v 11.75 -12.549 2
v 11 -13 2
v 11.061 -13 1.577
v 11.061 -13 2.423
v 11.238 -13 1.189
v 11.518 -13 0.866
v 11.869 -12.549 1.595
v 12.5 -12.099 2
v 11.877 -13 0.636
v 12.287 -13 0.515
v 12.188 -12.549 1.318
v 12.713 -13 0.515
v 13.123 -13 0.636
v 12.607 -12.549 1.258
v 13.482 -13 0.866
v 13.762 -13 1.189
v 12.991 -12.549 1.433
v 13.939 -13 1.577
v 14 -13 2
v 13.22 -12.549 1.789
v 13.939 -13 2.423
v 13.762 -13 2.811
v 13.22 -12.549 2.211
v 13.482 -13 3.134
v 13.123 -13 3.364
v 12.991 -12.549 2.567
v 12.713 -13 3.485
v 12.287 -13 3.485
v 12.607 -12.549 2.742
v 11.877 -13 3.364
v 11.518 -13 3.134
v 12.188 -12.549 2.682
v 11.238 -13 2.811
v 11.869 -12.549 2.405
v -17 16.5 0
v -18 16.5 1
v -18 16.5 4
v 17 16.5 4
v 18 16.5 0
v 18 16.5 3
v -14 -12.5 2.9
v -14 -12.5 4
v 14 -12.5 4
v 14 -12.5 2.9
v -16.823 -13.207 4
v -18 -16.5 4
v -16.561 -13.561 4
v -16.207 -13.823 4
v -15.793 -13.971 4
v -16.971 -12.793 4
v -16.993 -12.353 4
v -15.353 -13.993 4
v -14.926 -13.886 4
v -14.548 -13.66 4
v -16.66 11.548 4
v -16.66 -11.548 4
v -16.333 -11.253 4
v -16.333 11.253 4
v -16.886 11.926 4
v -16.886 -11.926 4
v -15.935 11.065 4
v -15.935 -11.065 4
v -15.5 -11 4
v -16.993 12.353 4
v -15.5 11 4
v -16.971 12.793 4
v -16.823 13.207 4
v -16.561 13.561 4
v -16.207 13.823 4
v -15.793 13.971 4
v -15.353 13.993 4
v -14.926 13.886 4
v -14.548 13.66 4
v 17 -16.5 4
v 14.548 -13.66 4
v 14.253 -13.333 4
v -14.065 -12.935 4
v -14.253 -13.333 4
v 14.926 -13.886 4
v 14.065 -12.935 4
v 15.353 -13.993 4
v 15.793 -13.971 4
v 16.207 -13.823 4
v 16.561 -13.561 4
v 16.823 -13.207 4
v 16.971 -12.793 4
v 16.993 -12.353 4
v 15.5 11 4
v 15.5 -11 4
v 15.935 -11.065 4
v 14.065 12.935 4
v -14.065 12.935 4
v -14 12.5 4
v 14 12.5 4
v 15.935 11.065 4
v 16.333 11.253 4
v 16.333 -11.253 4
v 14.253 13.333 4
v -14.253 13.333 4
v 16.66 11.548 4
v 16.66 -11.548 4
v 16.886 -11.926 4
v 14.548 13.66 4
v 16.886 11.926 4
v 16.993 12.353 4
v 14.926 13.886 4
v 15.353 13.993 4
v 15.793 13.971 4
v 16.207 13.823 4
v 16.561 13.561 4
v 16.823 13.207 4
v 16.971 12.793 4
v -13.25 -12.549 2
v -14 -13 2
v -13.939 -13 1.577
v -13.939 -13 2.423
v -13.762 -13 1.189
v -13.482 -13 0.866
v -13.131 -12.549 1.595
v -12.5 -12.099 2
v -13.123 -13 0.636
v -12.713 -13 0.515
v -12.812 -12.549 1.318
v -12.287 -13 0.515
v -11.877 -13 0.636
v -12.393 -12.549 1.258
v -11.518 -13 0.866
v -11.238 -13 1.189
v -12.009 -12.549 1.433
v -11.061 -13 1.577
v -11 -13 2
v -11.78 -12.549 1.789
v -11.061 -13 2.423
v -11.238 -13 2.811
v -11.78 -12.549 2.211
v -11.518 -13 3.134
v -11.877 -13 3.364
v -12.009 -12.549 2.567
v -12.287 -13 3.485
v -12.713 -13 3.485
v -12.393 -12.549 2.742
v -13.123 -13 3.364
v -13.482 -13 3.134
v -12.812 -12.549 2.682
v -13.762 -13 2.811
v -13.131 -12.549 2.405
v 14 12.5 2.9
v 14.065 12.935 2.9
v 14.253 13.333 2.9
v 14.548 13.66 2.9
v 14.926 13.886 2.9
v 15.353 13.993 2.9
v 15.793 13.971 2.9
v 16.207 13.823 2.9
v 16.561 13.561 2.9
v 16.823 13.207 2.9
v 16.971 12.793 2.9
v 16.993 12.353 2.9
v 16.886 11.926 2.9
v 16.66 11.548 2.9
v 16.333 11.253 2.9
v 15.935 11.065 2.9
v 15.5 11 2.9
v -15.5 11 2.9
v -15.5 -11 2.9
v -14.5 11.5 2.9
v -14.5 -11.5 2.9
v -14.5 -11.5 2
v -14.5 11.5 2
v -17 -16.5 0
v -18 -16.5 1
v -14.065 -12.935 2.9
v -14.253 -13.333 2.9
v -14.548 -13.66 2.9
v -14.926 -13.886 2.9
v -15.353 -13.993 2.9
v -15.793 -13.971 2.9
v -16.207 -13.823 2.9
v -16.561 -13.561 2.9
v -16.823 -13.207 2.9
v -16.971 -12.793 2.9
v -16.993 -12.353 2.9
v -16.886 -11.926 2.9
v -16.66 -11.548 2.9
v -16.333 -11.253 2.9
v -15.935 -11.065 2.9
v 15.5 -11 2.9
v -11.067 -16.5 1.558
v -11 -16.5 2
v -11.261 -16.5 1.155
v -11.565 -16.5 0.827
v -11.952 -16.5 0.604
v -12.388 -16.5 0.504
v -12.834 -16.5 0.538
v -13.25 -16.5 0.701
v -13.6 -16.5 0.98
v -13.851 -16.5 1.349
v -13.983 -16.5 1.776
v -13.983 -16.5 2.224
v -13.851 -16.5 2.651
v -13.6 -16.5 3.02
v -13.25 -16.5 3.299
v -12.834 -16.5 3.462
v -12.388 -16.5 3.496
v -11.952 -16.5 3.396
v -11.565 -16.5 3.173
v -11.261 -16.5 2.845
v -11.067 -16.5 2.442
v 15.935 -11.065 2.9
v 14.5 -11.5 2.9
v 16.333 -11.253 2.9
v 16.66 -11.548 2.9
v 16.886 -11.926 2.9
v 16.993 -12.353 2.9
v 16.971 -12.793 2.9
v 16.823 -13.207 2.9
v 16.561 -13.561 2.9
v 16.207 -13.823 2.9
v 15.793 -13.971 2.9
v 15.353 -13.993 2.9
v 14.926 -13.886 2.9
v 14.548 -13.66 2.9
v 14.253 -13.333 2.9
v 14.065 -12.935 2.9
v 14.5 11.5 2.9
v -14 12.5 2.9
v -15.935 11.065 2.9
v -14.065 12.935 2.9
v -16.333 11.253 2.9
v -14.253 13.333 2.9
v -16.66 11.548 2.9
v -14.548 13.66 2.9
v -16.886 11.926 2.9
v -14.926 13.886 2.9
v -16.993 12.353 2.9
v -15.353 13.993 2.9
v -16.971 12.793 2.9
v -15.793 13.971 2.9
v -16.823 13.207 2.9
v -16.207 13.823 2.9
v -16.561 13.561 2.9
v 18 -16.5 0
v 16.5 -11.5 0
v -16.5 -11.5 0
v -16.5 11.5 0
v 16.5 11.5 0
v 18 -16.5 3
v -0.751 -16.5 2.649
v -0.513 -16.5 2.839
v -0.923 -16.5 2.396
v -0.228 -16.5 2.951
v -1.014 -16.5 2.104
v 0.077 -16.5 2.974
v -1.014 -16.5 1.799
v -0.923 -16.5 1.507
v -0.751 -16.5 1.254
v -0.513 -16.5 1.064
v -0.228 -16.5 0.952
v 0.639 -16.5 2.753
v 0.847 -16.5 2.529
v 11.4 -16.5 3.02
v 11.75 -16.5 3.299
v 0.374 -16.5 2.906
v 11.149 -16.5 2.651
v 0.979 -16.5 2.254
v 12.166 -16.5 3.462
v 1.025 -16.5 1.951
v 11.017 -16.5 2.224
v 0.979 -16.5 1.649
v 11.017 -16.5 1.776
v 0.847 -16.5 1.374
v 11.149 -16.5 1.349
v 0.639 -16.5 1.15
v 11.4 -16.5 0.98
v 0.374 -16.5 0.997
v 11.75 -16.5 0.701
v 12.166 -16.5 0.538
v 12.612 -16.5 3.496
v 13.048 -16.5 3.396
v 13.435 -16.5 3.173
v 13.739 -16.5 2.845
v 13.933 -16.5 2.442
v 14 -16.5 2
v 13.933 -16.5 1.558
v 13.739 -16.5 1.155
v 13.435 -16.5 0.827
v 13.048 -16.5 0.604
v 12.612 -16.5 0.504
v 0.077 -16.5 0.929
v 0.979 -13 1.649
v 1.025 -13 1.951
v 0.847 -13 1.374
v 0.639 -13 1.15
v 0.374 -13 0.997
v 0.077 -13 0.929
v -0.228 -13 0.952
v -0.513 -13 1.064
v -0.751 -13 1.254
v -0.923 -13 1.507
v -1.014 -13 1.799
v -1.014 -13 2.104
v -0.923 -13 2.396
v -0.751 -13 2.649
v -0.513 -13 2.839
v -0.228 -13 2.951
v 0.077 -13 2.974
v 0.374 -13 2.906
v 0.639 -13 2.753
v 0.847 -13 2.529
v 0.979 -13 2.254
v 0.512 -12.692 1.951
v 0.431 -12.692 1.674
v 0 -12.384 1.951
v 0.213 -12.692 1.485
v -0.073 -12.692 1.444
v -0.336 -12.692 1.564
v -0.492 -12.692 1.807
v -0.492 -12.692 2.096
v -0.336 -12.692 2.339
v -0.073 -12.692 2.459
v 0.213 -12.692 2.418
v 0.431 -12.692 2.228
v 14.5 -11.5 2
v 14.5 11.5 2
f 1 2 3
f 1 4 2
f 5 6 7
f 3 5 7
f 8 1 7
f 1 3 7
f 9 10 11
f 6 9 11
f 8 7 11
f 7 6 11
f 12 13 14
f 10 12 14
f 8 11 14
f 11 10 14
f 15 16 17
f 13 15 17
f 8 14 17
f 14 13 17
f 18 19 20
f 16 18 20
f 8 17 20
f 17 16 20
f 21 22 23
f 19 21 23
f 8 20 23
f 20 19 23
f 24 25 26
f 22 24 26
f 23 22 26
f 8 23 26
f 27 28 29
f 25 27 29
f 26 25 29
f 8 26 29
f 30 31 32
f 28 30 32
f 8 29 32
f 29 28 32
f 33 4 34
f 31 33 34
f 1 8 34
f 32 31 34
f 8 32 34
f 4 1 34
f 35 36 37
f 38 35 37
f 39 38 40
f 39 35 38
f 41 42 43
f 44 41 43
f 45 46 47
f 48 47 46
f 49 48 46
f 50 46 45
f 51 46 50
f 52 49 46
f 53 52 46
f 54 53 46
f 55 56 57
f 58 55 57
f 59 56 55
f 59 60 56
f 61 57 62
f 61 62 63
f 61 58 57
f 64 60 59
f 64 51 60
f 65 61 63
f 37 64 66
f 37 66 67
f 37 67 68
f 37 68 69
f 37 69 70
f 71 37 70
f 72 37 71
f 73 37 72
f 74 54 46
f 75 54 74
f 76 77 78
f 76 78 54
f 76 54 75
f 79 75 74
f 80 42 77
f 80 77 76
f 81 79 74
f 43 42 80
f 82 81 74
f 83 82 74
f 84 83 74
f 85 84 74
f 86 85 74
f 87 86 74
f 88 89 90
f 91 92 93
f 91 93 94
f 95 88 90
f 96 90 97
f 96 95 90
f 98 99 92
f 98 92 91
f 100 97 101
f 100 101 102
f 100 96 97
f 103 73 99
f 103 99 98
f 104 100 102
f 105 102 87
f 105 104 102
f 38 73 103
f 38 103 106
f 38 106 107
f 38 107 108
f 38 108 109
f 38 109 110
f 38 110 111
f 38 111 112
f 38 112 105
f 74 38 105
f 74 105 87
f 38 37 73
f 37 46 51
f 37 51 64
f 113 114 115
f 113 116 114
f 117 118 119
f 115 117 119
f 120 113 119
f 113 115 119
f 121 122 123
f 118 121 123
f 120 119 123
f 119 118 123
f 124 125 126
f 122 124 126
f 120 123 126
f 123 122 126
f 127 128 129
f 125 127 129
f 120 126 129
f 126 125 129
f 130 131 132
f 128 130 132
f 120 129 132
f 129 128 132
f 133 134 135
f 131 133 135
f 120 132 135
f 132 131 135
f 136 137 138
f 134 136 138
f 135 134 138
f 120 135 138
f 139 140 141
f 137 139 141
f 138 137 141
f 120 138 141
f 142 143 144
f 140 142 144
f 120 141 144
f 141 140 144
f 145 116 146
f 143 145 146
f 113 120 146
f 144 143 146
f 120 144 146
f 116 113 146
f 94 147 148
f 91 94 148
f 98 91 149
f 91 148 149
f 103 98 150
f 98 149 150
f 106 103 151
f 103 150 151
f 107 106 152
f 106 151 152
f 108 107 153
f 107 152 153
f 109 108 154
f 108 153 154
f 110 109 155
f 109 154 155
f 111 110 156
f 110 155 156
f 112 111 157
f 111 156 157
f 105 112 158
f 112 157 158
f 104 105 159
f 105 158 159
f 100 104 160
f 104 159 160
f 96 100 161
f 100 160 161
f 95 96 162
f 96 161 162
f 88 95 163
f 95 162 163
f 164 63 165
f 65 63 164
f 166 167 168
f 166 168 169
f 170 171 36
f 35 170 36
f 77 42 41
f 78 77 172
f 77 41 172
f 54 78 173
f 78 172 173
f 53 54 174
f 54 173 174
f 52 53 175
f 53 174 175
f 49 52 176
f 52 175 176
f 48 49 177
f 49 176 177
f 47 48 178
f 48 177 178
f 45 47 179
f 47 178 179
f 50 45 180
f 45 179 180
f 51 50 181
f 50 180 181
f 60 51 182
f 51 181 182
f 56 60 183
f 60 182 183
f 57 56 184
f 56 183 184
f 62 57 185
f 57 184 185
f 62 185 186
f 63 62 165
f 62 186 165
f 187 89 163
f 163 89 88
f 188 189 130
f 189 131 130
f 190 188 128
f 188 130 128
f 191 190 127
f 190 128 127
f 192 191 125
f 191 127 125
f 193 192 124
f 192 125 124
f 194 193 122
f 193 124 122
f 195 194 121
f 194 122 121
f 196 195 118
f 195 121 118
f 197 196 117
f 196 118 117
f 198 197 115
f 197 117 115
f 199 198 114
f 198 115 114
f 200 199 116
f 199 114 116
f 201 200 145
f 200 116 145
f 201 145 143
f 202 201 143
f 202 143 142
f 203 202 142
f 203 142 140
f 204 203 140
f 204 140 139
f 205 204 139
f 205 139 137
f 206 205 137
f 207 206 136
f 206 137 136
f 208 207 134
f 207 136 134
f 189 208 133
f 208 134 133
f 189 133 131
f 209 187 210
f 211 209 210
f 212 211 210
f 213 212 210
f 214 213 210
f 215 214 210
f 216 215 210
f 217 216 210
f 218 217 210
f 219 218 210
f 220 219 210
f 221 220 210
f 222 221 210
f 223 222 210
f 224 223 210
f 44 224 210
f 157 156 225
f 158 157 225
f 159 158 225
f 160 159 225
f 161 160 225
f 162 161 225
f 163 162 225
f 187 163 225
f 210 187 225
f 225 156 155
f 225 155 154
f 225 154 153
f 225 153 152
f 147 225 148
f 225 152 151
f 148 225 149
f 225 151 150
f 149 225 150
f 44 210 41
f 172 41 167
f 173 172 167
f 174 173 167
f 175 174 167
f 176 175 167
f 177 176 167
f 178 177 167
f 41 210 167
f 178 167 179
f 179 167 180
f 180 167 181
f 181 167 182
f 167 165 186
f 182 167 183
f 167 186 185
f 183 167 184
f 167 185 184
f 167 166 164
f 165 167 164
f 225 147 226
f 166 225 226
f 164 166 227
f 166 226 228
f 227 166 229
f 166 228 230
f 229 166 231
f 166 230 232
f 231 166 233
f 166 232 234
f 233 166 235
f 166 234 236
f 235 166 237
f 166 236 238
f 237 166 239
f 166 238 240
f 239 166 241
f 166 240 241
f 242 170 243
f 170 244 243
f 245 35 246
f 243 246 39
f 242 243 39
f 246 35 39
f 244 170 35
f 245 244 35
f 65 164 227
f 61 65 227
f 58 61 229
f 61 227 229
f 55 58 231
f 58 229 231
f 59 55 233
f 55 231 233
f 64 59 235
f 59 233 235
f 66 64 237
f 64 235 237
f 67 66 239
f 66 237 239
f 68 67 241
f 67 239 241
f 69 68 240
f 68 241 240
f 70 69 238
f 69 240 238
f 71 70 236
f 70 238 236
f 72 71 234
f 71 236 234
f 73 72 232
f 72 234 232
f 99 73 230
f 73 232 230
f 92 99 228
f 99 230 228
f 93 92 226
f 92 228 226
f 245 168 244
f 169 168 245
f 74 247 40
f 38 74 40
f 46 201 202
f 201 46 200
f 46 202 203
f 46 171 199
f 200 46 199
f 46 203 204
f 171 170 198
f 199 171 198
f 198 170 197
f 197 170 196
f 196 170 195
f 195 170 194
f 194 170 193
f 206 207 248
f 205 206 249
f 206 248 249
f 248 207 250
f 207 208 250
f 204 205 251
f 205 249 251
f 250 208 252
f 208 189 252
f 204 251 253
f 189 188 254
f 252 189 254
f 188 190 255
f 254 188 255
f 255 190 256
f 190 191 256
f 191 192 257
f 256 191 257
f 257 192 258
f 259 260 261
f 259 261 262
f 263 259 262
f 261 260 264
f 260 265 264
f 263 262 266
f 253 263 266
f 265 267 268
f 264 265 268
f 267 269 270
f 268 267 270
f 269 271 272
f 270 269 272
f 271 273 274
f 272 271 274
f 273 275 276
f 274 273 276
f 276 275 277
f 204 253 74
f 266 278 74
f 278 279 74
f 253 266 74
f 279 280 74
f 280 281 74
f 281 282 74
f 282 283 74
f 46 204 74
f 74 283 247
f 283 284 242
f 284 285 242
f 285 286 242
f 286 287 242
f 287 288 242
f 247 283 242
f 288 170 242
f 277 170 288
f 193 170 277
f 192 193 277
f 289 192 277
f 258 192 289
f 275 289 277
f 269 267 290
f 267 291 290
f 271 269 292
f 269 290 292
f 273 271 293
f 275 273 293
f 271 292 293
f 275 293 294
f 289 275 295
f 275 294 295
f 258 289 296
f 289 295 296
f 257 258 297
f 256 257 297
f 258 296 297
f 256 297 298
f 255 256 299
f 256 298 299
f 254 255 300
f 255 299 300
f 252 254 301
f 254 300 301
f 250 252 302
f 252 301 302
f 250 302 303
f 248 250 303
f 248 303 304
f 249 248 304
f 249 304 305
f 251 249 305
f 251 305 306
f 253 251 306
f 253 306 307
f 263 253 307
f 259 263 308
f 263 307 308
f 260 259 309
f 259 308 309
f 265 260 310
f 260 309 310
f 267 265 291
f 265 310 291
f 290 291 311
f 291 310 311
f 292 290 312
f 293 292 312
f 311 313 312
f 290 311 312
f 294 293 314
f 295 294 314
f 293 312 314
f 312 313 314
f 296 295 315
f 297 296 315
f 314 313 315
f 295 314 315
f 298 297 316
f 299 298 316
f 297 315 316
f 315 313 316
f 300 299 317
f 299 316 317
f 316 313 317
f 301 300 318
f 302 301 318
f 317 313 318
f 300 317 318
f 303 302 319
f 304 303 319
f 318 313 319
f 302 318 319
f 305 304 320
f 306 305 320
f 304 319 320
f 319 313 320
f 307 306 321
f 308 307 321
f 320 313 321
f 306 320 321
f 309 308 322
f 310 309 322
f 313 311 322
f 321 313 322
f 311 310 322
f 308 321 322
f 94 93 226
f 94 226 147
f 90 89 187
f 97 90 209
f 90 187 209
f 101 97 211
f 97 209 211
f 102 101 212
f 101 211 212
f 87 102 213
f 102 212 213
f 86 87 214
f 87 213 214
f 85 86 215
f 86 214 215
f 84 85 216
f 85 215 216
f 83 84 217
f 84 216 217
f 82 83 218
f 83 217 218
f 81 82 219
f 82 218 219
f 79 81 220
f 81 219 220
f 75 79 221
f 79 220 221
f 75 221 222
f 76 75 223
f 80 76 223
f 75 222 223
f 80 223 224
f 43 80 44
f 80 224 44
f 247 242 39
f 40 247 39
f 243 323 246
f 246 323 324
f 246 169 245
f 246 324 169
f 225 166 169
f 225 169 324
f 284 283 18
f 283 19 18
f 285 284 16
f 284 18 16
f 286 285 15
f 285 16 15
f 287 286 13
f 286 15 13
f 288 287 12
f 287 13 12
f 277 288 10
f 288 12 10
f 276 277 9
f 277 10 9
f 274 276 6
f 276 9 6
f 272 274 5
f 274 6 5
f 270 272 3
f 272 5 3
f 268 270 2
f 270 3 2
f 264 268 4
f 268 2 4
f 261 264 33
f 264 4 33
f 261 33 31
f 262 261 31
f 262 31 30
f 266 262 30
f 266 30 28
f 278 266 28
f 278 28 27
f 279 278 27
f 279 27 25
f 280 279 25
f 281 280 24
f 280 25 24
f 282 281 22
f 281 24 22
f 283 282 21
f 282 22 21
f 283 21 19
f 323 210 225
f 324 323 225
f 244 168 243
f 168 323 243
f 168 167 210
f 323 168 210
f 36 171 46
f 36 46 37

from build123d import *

# Parameters (mm, degrees)
SKETCH1_W                 = 36
SKETCH1_H                 = 33
BOSS_EXTRUDE1_DEPTH       = 4
SKETCH2_W                 = 31
SKETCH2_H                 = 25
CUT_EXTRUDE1_DEPTH        = 1.1
F_3_0MM_DOWEL_HOLE1_D     = 3
F_3_0MM_DOWEL_HOLE1_DEPTH = 1.1
SKETCH5_W                 = 29
SKETCH5_H                 = 23
CUT_EXTRUDE2_DEPTH        = 25.589835298
CHAMFER1_SIZE             = 2
CHAMFER2_SIZE             = 1
F_3_0MM_DOWEL_HOLE2_D     = 3
F_3_0MM_DOWEL_HOLE2_DEPTH = 3.5
F_3_0MM_DOWEL_HOLE2_TIP   = 0.901290929


# Read off the part's stored shape, not the designer's step: M2.5x0.45 Tapped Hole1
with BuildPart() as part:
    # Sketch1 → Boss-Extrude1 (new body)
    with BuildSketch(Plane.XY):
        Rectangle(SKETCH1_W, SKETCH1_H)
    extrude(amount=BOSS_EXTRUDE1_DEPTH)

    # Sketch2 → Cut-Extrude1 (cut)
    with BuildSketch(Plane.XY.offset(4)):
        Rectangle(SKETCH2_W, SKETCH2_H)
    extrude(amount=-CUT_EXTRUDE1_DEPTH, mode=Mode.SUBTRACT)

    # Ø3.0mm Dowel Hole1
    with Locations(Plane.XY.offset(4)):
        with Locations((-15.5, 12.5), (15.5, 12.5), (15.5, -12.5), (-15.5, -12.5)):
            Hole(F_3_0MM_DOWEL_HOLE1_D / 2, depth=F_3_0MM_DOWEL_HOLE1_DEPTH)

    # Sketch5 → Cut-Extrude2 (cut, through all)
    with BuildSketch(Plane.XY.offset(2.9)):
        Rectangle(SKETCH5_W, SKETCH5_H)
    extrude(amount=-CUT_EXTRUDE2_DEPTH, mode=Mode.SUBTRACT)

    # Chamfer1
    chamfer1_edges = [part.edges().sort_by_distance(p)[0] for p in [
        (14.5, 0, 0),
        (-14.5, 0, 0),
    ]]
    chamfer(chamfer1_edges, length=CHAMFER1_SIZE)

    # Chamfer2
    chamfer2_edges = [part.edges().sort_by_distance(p)[0] for p in [
        (18, 0, 4),
        (-18, 0, 0),
    ]]
    chamfer(chamfer2_edges, length=CHAMFER2_SIZE - 0.0001)  # a hair under: the kernel refuses the full size

    # Ø3.0mm Dowel Hole2
    with Locations(Plane(origin=(0, -16.5, 0), x_dir=(-1, 0, 0), z_dir=(0, -1, 0))):
        with Locations((12.5, -2), (-12.5, -2)):
            Hole(F_3_0MM_DOWEL_HOLE2_D / 2, depth=F_3_0MM_DOWEL_HOLE2_DEPTH)
            with Locations((0, 0, -(F_3_0MM_DOWEL_HOLE2_DEPTH + F_3_0MM_DOWEL_HOLE2_TIP / 2))):  # 118° drill point
                Cone(0, F_3_0MM_DOWEL_HOLE2_D / 2, F_3_0MM_DOWEL_HOLE2_TIP, mode=Mode.SUBTRACT)

    # M2.5x0.45 Tapped Hole1 outline → M2.5x0.45 Tapped Hole1 (revolve, cut)
    with BuildSketch(Plane.XY.offset(1.951410637)):
        Polygon((1.025, -13), (0, -12.384117865), (0, -16.5), (1.025, -16.5), align=None)
    revolve(axis=Axis((0, 0, 1.951410637), (0, 1, 0)), mode=Mode.SUBTRACT)


solid = part.part
